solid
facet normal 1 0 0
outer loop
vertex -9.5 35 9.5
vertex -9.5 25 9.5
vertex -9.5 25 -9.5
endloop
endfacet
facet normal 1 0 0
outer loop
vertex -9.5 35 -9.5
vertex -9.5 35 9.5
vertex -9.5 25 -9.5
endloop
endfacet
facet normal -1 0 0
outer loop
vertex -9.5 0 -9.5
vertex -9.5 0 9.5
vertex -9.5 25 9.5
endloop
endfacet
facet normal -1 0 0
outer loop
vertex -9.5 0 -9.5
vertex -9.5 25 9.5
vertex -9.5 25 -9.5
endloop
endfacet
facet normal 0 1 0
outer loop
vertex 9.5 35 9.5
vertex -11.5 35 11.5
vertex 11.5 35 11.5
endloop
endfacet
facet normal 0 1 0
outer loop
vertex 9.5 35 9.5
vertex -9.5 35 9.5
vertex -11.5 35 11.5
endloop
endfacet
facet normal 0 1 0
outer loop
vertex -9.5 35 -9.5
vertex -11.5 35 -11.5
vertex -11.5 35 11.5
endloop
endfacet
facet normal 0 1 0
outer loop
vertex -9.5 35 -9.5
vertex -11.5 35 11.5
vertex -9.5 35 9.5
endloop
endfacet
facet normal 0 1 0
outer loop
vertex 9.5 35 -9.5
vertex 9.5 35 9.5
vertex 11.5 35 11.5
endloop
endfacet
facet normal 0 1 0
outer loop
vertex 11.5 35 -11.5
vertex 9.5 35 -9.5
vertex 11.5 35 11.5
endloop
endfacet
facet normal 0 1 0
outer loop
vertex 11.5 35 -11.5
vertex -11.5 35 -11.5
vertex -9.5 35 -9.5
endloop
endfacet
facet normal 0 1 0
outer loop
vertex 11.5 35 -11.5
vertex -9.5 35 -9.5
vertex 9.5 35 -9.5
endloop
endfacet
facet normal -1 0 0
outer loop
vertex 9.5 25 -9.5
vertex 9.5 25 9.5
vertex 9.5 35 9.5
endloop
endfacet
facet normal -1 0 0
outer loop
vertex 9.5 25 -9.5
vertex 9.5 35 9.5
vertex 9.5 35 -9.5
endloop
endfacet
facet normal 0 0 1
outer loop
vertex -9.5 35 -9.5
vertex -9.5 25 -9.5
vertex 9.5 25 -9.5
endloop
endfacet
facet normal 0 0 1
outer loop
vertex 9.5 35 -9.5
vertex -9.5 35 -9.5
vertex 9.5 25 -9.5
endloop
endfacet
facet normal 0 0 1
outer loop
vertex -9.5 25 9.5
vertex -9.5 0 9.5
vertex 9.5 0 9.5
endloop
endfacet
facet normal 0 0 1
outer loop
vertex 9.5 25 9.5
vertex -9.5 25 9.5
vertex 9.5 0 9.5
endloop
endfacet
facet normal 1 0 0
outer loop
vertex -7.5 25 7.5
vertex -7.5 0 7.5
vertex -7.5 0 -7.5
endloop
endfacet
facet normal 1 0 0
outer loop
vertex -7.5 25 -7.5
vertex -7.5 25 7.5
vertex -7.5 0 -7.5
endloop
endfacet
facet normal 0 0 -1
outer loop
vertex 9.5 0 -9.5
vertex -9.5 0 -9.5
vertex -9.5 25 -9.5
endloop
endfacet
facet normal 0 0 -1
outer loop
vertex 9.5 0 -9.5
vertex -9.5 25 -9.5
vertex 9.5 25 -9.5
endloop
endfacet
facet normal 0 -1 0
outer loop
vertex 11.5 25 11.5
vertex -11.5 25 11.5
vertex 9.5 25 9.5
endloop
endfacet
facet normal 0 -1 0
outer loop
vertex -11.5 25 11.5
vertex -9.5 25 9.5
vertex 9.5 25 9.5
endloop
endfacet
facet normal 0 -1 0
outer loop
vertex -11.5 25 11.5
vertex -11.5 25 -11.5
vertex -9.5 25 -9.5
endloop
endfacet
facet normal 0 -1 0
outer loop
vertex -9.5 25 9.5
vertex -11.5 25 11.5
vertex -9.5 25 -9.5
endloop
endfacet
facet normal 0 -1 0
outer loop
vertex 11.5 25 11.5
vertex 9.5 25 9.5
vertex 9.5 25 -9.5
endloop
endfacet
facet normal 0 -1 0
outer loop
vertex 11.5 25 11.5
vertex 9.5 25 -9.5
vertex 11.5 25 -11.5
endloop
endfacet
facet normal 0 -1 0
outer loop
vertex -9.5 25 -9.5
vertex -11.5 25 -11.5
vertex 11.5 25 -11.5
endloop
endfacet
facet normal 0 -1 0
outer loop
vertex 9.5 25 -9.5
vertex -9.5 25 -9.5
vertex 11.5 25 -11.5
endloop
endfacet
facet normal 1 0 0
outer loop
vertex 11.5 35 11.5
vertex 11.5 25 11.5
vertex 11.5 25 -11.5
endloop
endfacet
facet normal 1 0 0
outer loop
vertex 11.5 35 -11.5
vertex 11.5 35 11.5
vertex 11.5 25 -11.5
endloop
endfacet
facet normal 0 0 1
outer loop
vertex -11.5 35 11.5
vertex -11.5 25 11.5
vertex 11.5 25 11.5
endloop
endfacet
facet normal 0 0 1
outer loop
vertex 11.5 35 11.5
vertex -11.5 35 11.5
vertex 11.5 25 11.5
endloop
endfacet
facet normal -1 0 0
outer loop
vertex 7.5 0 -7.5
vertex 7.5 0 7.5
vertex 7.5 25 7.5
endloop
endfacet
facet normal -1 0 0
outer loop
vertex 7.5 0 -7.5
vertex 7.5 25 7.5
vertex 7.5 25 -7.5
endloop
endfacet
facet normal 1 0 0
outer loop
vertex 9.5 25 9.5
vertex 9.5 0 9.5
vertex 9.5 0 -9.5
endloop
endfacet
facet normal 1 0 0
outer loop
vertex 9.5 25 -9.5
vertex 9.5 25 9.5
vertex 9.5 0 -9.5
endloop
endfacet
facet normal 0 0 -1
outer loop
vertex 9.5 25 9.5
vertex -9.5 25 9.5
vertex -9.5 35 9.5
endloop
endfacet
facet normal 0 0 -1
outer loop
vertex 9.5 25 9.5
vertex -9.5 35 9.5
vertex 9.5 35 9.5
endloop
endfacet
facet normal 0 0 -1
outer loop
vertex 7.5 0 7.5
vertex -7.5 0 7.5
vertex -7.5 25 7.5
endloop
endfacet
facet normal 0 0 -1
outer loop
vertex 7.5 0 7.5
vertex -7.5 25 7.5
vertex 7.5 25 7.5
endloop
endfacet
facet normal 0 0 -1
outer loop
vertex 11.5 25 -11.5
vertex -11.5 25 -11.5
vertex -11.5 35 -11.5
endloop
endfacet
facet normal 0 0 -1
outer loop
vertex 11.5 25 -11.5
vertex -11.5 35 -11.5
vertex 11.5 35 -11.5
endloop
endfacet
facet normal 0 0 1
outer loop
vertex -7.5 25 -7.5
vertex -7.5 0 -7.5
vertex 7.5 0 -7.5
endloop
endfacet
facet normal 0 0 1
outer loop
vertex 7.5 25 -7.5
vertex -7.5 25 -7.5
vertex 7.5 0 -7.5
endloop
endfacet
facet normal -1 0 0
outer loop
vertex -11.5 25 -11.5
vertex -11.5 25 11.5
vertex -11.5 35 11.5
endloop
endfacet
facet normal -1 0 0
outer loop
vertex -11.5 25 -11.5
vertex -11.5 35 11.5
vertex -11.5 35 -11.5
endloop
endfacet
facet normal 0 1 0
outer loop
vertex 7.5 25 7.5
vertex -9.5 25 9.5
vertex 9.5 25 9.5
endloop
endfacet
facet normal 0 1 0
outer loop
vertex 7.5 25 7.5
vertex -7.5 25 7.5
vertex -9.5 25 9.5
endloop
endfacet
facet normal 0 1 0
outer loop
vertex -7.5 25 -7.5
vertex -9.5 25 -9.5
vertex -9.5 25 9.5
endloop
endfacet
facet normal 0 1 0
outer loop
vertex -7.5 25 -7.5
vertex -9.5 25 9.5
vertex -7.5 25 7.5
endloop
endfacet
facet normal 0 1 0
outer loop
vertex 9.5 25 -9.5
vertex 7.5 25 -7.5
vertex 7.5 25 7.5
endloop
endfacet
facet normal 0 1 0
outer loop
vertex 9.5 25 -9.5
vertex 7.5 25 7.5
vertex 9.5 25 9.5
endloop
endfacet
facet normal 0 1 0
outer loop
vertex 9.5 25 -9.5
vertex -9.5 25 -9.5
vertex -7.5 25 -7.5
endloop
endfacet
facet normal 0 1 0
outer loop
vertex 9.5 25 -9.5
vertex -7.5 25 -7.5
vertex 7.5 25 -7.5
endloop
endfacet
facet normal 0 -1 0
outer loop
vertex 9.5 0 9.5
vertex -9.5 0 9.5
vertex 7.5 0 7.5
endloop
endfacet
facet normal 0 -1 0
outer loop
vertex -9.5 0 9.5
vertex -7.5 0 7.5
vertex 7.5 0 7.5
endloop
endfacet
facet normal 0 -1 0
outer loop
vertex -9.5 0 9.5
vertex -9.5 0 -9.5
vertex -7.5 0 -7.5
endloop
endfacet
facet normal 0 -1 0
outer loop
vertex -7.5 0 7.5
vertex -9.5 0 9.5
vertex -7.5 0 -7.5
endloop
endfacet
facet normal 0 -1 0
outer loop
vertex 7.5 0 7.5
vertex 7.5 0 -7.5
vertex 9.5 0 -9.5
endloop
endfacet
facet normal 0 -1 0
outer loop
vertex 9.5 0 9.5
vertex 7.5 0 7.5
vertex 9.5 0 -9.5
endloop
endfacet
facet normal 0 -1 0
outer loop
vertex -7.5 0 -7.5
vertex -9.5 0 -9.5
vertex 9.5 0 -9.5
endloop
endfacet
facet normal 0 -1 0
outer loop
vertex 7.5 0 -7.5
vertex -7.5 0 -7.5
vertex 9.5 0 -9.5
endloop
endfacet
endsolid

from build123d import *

# Parameters (mm, degrees)
CROQUIS1_W              = 19
CROQUIS1_H              = 19
CROQUIS1_W_2            = 15
CROQUIS1_H_2            = 15
SALIENTE_EXTRUIR1_DEPTH = 25
CROQUIS2_W              = 23
CROQUIS2_H              = 23
CROQUIS2_W_2            = 19
CROQUIS2_H_2            = 19
SALIENTE_EXTRUIR2_DEPTH = 10


with BuildPart() as part:
    # Croquis1 → Saliente-Extruir1 (new body)
    with BuildSketch(Plane(origin=(0, 0, 0), x_dir=(1, 0, 0), z_dir=(0, 1, 0))):
        Rectangle(CROQUIS1_W, CROQUIS1_H)
        Rectangle(CROQUIS1_W_2, CROQUIS1_H_2, mode=Mode.SUBTRACT)
    extrude(amount=SALIENTE_EXTRUIR1_DEPTH)


with BuildPart() as body_2:
    # Croquis2 → Saliente-Extruir2 (new body)
    with BuildSketch(Plane(origin=(0, 25, 0), x_dir=(1, 0, 0), z_dir=(0, 1, 0))):
        Rectangle(CROQUIS2_W, CROQUIS2_H)
        Rectangle(CROQUIS2_W_2, CROQUIS2_H_2, mode=Mode.SUBTRACT)
    extrude(amount=SALIENTE_EXTRUIR2_DEPTH)


solid = Compound([part.part, body_2.part])
